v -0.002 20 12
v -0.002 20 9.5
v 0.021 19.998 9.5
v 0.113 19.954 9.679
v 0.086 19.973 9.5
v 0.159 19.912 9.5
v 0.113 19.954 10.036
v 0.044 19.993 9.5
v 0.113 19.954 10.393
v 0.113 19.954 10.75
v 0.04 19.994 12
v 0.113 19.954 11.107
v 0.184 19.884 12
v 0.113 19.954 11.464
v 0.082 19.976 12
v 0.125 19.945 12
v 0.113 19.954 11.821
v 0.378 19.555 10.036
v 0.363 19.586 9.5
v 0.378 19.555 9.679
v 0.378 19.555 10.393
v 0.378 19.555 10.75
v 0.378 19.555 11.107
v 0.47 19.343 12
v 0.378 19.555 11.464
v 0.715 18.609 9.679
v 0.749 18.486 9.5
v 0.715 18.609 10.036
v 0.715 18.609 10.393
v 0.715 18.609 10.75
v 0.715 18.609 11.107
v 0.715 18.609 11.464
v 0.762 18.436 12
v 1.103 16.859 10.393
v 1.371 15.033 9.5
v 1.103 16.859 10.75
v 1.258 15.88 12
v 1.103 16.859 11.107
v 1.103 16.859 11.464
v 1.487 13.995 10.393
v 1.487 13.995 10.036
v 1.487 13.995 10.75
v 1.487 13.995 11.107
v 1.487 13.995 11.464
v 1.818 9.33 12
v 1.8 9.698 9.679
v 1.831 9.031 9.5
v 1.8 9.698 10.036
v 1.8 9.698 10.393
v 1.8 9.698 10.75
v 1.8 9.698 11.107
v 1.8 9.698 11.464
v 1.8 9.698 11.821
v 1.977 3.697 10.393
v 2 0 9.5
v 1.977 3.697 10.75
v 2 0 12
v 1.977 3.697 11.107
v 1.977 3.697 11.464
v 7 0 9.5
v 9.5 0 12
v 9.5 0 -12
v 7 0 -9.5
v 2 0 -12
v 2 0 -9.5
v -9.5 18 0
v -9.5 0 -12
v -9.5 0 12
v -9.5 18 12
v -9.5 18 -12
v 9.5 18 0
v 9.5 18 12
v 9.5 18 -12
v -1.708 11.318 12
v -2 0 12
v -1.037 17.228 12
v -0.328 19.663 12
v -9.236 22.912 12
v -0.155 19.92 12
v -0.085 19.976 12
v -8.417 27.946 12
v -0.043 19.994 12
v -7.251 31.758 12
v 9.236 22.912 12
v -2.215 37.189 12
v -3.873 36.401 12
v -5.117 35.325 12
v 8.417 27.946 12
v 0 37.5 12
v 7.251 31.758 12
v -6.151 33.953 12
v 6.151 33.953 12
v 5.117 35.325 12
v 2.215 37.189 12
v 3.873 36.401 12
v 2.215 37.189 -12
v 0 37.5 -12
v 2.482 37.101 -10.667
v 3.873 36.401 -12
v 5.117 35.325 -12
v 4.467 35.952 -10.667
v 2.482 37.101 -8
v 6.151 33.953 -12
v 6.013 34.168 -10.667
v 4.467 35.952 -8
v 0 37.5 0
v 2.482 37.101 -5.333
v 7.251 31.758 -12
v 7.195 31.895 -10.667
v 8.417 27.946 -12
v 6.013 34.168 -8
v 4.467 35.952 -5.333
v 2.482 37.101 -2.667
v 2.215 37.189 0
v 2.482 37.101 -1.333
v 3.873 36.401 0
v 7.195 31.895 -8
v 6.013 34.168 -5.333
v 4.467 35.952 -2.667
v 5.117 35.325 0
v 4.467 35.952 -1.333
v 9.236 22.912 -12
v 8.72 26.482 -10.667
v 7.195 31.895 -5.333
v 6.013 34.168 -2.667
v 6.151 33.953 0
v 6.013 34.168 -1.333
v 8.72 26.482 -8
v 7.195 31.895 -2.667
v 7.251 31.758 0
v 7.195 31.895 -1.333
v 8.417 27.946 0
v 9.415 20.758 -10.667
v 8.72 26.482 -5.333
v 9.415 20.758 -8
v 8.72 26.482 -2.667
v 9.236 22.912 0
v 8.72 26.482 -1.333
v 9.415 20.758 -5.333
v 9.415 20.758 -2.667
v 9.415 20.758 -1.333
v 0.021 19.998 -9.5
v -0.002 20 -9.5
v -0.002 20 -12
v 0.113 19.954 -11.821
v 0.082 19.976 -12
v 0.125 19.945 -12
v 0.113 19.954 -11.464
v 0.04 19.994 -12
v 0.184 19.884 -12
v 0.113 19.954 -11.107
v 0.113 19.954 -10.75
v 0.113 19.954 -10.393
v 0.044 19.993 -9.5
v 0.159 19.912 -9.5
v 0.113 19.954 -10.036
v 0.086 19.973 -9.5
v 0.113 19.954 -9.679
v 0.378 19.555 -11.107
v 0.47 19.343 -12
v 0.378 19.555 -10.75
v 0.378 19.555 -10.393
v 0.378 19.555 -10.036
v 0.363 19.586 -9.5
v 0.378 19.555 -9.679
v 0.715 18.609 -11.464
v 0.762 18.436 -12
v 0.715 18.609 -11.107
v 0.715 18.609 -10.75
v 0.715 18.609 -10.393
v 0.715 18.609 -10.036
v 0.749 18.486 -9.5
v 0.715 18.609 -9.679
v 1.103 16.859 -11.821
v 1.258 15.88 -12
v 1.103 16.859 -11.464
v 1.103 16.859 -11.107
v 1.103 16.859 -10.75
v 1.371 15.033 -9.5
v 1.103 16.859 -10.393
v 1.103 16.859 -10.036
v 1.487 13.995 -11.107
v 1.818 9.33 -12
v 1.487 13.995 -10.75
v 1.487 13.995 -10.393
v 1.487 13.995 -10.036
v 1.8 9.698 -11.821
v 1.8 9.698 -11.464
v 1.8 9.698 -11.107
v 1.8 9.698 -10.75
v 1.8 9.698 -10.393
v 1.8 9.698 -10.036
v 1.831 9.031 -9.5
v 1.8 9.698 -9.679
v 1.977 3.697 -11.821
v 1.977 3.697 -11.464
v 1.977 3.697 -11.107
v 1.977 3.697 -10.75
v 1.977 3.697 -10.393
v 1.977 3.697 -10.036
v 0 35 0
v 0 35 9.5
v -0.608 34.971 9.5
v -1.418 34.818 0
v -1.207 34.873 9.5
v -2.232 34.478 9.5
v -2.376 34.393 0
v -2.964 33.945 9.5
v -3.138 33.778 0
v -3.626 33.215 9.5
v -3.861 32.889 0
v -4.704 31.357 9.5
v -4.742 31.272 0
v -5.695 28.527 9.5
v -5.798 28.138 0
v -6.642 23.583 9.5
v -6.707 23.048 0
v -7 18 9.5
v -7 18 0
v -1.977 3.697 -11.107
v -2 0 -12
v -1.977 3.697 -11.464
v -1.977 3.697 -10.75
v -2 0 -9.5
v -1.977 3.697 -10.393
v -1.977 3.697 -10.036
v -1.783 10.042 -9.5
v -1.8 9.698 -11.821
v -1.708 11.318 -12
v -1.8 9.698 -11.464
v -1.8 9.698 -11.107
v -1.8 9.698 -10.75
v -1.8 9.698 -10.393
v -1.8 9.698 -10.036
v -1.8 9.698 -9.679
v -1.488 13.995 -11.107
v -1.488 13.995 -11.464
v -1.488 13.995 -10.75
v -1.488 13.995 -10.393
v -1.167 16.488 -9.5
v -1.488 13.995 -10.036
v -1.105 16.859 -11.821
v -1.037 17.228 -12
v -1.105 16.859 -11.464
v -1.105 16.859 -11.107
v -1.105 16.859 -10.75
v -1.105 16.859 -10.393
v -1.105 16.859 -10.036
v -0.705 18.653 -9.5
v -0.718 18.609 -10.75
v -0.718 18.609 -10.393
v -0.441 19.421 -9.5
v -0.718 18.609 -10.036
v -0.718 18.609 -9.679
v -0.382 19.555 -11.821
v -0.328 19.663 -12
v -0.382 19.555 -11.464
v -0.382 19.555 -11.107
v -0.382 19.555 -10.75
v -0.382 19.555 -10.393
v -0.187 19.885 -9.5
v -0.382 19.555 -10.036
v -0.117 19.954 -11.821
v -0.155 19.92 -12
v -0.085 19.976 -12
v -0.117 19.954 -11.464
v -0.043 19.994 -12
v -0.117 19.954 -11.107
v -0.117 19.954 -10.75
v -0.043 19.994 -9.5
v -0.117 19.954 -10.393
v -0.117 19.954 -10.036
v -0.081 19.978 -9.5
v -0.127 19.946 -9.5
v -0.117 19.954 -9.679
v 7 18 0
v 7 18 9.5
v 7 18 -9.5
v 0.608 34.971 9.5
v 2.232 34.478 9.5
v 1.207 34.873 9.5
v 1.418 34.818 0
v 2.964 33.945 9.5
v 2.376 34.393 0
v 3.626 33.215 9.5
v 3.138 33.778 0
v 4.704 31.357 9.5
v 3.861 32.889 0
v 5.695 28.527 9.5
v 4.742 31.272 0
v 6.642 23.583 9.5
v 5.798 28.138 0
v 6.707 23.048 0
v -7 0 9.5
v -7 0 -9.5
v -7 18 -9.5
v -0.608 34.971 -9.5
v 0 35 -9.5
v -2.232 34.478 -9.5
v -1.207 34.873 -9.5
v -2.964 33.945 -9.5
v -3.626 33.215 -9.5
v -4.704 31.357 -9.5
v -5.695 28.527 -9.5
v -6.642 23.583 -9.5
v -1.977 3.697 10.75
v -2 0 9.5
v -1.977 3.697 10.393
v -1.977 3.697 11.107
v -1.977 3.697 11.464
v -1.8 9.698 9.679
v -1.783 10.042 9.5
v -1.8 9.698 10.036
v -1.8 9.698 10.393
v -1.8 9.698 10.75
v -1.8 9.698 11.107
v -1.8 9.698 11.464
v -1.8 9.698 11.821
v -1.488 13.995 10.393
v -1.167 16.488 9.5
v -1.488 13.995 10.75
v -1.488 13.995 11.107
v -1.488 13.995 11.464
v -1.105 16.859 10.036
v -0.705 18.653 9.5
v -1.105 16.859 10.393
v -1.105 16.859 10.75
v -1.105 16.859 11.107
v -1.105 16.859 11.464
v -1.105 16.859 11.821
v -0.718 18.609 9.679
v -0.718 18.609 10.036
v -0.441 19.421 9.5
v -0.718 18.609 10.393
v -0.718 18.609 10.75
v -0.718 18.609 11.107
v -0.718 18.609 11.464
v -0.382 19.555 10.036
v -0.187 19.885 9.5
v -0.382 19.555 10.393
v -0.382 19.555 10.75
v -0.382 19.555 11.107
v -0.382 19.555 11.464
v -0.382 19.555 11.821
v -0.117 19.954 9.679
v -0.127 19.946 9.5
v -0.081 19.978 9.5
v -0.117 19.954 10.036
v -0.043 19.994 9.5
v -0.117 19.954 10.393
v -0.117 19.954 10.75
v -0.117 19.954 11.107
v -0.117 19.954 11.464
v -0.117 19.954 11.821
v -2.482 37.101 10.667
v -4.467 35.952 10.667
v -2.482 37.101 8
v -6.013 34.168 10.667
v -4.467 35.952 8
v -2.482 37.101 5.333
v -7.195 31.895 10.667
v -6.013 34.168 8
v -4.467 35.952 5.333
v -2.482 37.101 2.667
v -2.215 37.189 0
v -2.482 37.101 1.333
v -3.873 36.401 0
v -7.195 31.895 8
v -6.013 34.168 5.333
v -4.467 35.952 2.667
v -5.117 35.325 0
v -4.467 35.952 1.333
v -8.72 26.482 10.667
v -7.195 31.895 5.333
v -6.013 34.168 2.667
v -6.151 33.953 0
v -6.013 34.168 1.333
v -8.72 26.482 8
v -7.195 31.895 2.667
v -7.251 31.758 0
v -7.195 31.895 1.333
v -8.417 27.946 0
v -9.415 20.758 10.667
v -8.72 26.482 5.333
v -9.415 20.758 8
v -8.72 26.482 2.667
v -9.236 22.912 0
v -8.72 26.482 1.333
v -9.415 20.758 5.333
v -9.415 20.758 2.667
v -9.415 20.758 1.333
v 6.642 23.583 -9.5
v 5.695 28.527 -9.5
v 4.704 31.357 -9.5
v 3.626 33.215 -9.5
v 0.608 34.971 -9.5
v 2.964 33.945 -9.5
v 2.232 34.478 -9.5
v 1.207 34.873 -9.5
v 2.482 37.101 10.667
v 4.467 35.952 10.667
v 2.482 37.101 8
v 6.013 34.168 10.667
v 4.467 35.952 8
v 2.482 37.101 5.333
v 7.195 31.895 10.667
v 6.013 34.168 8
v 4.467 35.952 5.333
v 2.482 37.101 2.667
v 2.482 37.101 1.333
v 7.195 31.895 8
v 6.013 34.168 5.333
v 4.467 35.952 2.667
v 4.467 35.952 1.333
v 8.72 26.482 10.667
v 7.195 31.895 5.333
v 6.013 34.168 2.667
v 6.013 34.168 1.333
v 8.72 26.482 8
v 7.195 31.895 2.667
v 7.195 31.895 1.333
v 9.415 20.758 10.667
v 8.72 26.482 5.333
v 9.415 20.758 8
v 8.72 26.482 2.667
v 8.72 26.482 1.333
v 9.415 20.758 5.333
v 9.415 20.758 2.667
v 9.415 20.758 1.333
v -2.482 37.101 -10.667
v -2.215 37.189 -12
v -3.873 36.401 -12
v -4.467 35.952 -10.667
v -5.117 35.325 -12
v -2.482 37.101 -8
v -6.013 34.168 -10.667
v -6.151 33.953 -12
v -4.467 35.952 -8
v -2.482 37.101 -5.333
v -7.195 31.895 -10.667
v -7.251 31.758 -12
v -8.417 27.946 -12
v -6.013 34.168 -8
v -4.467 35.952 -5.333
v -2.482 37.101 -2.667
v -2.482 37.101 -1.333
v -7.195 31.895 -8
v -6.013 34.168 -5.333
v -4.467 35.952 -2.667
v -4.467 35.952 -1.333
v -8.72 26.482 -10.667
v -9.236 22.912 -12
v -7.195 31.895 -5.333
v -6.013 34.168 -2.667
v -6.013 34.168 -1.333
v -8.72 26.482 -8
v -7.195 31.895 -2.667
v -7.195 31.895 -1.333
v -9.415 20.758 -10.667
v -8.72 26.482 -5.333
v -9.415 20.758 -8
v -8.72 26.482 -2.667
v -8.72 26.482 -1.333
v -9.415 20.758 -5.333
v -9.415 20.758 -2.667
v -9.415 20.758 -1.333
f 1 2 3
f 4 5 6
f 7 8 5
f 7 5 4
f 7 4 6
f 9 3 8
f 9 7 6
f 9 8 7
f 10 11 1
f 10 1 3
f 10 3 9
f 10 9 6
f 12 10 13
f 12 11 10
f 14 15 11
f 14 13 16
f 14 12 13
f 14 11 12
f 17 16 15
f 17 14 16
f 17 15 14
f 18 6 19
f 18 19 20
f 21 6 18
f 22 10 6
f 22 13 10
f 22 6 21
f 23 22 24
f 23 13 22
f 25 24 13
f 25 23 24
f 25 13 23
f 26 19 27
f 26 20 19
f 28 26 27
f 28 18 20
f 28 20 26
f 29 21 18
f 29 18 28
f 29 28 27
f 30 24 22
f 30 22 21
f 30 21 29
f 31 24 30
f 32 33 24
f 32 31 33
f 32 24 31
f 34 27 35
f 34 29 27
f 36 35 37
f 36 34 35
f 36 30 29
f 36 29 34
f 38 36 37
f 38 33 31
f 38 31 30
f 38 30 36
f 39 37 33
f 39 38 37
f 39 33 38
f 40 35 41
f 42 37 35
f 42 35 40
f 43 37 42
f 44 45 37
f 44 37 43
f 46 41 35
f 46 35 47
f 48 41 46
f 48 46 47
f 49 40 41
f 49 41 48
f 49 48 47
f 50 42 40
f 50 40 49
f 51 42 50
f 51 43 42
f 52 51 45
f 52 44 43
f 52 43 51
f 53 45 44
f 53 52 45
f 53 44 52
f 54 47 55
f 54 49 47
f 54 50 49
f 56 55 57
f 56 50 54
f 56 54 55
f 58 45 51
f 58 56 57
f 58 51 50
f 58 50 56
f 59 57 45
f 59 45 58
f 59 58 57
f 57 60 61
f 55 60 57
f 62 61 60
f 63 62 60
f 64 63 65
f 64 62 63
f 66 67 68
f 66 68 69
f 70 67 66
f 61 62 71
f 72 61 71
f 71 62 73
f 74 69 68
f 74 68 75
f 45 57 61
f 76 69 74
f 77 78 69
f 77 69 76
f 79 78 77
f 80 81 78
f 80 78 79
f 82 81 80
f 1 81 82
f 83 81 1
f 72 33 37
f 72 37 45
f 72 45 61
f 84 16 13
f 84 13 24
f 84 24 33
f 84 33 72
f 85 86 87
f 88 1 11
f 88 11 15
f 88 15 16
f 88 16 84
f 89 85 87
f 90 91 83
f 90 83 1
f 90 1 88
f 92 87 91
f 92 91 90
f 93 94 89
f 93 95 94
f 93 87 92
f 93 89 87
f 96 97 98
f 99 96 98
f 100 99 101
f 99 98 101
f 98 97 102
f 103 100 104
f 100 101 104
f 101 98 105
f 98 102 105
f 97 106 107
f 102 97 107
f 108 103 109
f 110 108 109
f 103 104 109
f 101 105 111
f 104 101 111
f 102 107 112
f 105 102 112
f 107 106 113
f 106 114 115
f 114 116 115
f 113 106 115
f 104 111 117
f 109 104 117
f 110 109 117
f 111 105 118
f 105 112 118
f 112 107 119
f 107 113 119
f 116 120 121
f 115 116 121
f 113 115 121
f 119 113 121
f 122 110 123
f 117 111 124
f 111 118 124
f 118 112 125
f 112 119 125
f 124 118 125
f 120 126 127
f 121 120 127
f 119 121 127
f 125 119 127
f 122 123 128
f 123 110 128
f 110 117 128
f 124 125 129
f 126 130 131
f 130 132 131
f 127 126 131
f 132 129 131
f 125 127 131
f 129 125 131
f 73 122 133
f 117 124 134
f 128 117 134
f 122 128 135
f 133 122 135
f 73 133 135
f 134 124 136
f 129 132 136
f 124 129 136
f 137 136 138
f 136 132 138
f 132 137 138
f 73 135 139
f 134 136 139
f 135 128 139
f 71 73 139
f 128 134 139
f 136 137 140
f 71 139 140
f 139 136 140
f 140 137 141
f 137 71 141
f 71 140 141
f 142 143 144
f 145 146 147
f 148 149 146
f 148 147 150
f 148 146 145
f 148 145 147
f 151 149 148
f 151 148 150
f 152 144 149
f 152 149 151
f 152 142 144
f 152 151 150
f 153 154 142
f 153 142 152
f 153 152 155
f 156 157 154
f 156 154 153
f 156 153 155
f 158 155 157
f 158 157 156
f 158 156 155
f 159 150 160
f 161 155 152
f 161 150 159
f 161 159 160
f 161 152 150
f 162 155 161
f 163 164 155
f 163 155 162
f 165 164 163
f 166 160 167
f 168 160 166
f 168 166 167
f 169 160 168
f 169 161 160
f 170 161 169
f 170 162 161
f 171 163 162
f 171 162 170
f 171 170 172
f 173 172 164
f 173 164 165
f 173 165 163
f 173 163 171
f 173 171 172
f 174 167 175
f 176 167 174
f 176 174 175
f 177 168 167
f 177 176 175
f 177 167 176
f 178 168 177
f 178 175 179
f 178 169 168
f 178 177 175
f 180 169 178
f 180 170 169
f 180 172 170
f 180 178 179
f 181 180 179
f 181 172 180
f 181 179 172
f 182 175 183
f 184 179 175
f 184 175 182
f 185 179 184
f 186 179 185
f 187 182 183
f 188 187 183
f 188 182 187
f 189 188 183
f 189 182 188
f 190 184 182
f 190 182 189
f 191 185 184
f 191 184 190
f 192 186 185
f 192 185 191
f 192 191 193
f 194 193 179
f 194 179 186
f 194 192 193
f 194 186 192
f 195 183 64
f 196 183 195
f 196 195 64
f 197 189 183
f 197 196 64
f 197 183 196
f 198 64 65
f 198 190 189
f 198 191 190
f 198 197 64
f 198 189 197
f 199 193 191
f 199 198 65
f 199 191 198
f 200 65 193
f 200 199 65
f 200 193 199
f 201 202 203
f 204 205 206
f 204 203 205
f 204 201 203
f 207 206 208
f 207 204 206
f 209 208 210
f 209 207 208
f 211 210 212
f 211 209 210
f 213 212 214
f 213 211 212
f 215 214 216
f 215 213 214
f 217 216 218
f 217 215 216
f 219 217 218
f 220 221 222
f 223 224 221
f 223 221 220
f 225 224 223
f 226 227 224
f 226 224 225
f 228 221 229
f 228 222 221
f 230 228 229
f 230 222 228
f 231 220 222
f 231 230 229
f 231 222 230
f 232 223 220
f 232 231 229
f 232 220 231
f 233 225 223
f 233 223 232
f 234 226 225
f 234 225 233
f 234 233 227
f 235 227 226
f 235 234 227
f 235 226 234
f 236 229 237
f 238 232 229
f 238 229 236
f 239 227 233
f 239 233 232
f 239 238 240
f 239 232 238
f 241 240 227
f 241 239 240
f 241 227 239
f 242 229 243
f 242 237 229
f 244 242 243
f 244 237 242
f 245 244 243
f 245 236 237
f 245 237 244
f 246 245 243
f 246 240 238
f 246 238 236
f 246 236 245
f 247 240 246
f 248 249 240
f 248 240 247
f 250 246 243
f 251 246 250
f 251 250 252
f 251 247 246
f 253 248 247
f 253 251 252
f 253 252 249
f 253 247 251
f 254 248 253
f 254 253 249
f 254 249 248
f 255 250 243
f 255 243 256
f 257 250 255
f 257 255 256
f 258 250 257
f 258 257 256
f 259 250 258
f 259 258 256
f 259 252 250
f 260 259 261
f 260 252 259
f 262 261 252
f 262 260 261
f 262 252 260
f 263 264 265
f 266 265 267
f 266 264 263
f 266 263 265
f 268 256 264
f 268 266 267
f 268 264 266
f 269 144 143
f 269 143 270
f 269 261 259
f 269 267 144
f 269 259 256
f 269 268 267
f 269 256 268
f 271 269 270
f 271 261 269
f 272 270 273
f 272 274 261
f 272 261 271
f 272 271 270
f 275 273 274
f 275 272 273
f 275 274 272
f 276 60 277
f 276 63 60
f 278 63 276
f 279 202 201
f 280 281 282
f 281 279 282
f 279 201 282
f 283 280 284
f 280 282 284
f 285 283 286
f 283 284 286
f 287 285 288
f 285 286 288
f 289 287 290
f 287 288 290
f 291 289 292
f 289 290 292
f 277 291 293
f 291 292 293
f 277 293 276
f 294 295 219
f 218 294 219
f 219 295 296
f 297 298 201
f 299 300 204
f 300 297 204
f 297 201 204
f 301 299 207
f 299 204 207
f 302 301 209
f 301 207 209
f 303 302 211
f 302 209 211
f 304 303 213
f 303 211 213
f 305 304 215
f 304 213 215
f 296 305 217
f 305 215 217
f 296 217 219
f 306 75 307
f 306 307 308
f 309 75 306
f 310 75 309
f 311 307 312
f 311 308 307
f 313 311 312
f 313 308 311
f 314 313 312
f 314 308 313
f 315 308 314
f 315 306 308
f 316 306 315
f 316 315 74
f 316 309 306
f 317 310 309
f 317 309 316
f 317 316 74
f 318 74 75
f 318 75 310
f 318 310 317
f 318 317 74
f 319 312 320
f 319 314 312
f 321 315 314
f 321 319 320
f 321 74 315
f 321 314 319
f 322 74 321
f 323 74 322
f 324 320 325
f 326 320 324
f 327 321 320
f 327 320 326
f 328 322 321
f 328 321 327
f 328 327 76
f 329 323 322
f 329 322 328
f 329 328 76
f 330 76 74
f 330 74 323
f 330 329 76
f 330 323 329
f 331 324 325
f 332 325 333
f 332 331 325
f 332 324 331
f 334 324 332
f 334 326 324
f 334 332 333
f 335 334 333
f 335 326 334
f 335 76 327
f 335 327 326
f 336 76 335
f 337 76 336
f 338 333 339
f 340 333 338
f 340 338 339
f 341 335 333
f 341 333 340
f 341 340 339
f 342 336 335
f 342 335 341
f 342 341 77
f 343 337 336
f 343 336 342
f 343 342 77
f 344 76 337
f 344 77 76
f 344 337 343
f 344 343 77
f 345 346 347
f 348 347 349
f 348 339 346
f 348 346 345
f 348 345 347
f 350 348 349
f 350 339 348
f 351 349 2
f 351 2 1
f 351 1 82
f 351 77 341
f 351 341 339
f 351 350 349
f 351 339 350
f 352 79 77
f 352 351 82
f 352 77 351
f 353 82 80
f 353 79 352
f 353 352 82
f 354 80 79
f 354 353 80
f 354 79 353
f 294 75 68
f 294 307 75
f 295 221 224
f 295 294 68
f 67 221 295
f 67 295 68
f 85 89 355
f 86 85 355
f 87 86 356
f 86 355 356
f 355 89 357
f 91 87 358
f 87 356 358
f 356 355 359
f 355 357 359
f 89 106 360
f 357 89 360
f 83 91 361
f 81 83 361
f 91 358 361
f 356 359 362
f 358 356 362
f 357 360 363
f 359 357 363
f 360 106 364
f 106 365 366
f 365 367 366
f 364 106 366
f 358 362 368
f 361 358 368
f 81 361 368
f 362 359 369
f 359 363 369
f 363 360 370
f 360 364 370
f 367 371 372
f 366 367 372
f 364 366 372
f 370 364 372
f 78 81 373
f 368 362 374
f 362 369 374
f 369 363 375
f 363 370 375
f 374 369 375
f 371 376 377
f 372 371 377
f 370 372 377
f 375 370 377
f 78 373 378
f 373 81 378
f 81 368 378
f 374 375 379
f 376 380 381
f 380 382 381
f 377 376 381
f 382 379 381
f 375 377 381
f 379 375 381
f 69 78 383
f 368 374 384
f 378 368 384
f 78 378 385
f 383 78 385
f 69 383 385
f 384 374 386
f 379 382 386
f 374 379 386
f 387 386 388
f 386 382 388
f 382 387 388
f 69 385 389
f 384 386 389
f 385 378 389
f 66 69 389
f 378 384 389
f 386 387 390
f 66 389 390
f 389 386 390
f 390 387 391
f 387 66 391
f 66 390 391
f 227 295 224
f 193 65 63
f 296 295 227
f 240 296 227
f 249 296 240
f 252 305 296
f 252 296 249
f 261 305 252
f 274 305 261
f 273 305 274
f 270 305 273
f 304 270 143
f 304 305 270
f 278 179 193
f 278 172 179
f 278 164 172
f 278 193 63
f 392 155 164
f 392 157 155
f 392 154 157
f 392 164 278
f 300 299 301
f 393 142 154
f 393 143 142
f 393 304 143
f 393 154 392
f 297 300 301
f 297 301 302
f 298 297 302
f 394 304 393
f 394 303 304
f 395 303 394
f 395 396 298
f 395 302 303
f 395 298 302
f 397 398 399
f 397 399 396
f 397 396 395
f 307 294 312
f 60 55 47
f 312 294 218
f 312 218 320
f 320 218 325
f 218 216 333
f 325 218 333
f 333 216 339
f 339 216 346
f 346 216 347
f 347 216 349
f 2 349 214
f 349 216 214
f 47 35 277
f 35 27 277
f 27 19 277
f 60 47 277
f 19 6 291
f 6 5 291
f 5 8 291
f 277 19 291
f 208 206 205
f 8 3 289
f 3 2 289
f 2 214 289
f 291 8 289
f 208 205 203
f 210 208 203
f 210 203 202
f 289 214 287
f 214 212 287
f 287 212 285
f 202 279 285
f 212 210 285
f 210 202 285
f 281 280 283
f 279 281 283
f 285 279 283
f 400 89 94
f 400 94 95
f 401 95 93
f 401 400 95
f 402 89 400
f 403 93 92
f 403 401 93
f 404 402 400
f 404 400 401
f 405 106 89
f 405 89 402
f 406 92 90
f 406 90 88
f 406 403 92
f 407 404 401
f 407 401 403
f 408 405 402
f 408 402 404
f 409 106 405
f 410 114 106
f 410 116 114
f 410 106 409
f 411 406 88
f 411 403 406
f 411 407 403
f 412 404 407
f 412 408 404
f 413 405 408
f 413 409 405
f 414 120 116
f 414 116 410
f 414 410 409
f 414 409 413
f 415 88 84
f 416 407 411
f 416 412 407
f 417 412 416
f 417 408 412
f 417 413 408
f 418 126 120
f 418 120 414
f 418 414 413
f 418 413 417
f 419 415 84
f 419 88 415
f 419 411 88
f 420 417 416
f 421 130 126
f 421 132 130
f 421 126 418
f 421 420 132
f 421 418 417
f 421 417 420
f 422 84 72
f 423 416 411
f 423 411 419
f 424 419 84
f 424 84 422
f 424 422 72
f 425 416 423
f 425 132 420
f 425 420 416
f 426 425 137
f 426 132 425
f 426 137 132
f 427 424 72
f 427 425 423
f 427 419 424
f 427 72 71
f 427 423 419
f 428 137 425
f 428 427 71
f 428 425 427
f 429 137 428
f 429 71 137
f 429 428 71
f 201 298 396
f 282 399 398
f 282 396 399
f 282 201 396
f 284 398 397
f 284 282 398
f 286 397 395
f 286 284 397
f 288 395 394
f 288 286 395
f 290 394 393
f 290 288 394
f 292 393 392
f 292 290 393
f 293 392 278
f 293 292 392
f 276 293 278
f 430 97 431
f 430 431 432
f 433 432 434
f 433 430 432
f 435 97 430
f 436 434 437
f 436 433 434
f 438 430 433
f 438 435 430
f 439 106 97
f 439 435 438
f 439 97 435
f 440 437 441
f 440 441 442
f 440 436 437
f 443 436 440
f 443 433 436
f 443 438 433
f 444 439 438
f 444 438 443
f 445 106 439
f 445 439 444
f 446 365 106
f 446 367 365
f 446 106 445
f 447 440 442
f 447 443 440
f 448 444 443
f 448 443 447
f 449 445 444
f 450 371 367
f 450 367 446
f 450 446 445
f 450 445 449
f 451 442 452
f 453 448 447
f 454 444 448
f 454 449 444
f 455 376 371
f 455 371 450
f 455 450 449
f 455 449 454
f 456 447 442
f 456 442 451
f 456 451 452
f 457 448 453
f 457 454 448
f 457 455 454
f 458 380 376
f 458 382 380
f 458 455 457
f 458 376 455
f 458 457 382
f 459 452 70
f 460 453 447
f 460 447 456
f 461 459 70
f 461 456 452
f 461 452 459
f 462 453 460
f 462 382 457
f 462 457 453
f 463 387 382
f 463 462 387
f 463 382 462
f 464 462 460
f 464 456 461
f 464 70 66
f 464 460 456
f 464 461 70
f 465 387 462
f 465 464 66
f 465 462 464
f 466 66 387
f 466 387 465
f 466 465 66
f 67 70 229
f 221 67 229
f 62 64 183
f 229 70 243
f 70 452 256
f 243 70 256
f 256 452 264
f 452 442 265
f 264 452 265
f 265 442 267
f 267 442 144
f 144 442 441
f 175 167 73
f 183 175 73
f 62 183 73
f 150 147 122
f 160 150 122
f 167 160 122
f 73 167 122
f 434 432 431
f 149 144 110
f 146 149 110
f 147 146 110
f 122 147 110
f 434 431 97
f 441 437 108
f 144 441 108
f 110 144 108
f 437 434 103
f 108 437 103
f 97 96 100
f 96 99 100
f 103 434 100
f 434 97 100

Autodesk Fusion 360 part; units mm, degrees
sketch "Skizze1" plane through (0, 0, 0) normal (0, 0, 1) x (1, 0, 0)
  line L0 (0, 0) -> (0, 35)
  line L1 (7, 0) -> (9.5, 0)
  line L2 (9.5, 0) -> (9.5, 18)
  line L3 (9.5, 18) -> (7, 18) construction
  line L4 (7, 18) -> (7, 0)
  spline S0 degree 5 poles (0, 35) (0.73, 35) (2.063, 34.7613) (3.6816, 33.688) (5.1796, 31.0566) (6.2948, 26.6703) (6.7786, 22.9675) (6.9597, 20.3756) (7, 18.7712) (7, 18) knots 0 0 0 0 0 0 0.2 0.4 0.6 0.8 1 1 1 1 1 1
  spline S1 degree 5 poles (0, 37.5) (0.9879, 37.5) (2.7924, 37.2385) (4.9853, 36.0627) (7.0185, 33.1717) (8.5367, 28.287) (9.1974, 24.0454) (9.445, 20.9552) (9.5, 18.9722) (9.5, 18) knots 0 0 0 0 0 0 0.2 0.4 0.6 0.8 1 1 1 1 1 1
  line L5 (0, 37.5) -> (0, 35)
  line L6 (-2.5, 37.5) -> (2.5, 37.5)
  line L7 (-1.5, 35) -> (1.5, 35)
  line L8 (7, 20) -> (7, 16)
  line L9 (9.5, 21) -> (9.5, 15)
  line L10 (0, 0) -> (7, 0)
  circle A0 centre (0, 16) radius 1
  line L11 (1, 16) -> (1, 0)
  line L12 (0, 0) -> (0, -5) construction
  line L13 (0, 37.5) -> (0, 35)
  line L14 (-1, 16) -> (-1, 0)
  line L15 (-7, 20) -> (-7, 16)
  circle A1 centre (0, 16) radius 1
  spline S2 degree 5 poles (0, 37.5) (-0.9879, 37.5) (-2.7924, 37.2385) (-4.9853, 36.0627) (-7.0185, 33.1717) (-8.5367, 28.287) (-9.1974, 24.0454) (-9.445, 20.9552) (-9.5, 18.9722) (-9.5, 18) knots 0 0 0 0 0 0 0.2 0.4 0.6 0.8 1 1 1 1 1 1
  line L16 (2.5, 37.5) -> (-2.5, 37.5)
  line L17 (-9.5, 21) -> (-9.5, 15)
  line L18 (-9.5, 21) -> (-9.5, 15)
  line L19 (0, 0) -> (-7, 0)
  line L20 (-9.5, 0) -> (-9.5, 18)
  line L21 (-9.5, 18) -> (-7, 18) construction
  spline S3 degree 5 poles (0, 35) (-0.73, 35) (-2.063, 34.7613) (-3.6816, 33.688) (-5.1796, 31.0566) (-6.2948, 26.6703) (-6.7786, 22.9675) (-6.9597, 20.3756) (-7, 18.7712) (-7, 18) knots 0 0 0 0 0 0 0.2 0.4 0.6 0.8 1 1 1 1 1 1
  line L22 (1.5, 35) -> (-1.5, 35)
  line L23 (-7, 20) -> (-7, 16)
  line L24 (-7, 0) -> (-9.5, 0)
  line L25 (-7, 18) -> (-7, 0)
  line L26 (0, 0) -> (0, 35)
  line L27 (1.5, 35) -> (-1.5, 35)
  line L28 (2.5, 37.5) -> (-2.5, 37.5)
  dimension "d1" = 18
  dimension "d2" = 5
  dimension "d3" = 3
  dimension "d4" = 4
  dimension "d5" = 6
  dimension "d6" = 7
  dimension "d7" = 35
  dimension "d8" = 2.5
  dimension "d9" = 16
  dimension "d10" = 2
extrude "Extrusion1" add sketch "Skizze1" along normal mid plane 24
shell "Schale1" thickness 2.5 removed faces 1 at (3.1667, 0, 4)
sketch "Skizze2" plane through (0, 0, 12) normal (0, 0, 1) x (1, 0, 0)
  line L0 (-9.5, 0) -> (9.5, 0)
  line L1 (9.5, 0) -> (9.5, 18)
  spline S0 degree 5 poles (9.5, 18) (9.5, 18.9722) (9.445, 20.9552) (9.1974, 24.0454) (8.5367, 28.287) (7.0185, 33.1717) (4.9853, 36.0627) (2.7924, 37.2385) (0.9879, 37.5) (0, 37.5) knots -1 -1 -1 -1 -1 -1 -0.8 -0.6 -0.4 -0.2 0 0 0 0 0 0
  spline S1 degree 5 poles (0, 37.5) (-0.9879, 37.5) (-2.7924, 37.2385) (-4.9853, 36.0627) (-7.0185, 33.1717) (-8.5367, 28.287) (-9.1974, 24.0454) (-9.445, 20.9552) (-9.5, 18.9722) (-9.5, 18) knots 0 0 0 0 0 0 0.2 0.4 0.6 0.8 1 1 1 1 1 1
  line L2 (-9.5, 18) -> (-9.5, 0)
  spline S2 degree 5 poles (-2, 0) (-2, 2.2036) (-1.9635, 6.2369) (-1.7993, 11.1651) (-1.4009, 15.6523) (-0.8096, 18.6119) (-0.3036, 19.8562) (-0.0021, 20.1554) (0.2998, 19.8561) (0.8069, 18.6119) (1.3996, 15.6524) (1.7989, 11.1652) (1.9634, 6.237) (2, 2.2037) (2, 0) knots 0 0 0 0 0 0 0.1 0.2 0.3 0.4 0.5 0.6 0.7 0.8 0.9 1 1 1 1 1 1
  line L3 (0, 0) -> (-0.002, 20) construction
  line L4 (-0.102, 20) -> (0.098, 20)
  line L5 (2, 5) -> (2, -5)
  line L6 (-2, -5) -> (-2, 5)
  point P0 (-0.002, 20)
  dimension "d14" = 4
  dimension "d15" = 10
  dimension "d16" = 0.2
  dimension "d17" = 20
extrude "Extrusion2" cut sketch "Skizze2" against normal blind 24 contours L0 S2
